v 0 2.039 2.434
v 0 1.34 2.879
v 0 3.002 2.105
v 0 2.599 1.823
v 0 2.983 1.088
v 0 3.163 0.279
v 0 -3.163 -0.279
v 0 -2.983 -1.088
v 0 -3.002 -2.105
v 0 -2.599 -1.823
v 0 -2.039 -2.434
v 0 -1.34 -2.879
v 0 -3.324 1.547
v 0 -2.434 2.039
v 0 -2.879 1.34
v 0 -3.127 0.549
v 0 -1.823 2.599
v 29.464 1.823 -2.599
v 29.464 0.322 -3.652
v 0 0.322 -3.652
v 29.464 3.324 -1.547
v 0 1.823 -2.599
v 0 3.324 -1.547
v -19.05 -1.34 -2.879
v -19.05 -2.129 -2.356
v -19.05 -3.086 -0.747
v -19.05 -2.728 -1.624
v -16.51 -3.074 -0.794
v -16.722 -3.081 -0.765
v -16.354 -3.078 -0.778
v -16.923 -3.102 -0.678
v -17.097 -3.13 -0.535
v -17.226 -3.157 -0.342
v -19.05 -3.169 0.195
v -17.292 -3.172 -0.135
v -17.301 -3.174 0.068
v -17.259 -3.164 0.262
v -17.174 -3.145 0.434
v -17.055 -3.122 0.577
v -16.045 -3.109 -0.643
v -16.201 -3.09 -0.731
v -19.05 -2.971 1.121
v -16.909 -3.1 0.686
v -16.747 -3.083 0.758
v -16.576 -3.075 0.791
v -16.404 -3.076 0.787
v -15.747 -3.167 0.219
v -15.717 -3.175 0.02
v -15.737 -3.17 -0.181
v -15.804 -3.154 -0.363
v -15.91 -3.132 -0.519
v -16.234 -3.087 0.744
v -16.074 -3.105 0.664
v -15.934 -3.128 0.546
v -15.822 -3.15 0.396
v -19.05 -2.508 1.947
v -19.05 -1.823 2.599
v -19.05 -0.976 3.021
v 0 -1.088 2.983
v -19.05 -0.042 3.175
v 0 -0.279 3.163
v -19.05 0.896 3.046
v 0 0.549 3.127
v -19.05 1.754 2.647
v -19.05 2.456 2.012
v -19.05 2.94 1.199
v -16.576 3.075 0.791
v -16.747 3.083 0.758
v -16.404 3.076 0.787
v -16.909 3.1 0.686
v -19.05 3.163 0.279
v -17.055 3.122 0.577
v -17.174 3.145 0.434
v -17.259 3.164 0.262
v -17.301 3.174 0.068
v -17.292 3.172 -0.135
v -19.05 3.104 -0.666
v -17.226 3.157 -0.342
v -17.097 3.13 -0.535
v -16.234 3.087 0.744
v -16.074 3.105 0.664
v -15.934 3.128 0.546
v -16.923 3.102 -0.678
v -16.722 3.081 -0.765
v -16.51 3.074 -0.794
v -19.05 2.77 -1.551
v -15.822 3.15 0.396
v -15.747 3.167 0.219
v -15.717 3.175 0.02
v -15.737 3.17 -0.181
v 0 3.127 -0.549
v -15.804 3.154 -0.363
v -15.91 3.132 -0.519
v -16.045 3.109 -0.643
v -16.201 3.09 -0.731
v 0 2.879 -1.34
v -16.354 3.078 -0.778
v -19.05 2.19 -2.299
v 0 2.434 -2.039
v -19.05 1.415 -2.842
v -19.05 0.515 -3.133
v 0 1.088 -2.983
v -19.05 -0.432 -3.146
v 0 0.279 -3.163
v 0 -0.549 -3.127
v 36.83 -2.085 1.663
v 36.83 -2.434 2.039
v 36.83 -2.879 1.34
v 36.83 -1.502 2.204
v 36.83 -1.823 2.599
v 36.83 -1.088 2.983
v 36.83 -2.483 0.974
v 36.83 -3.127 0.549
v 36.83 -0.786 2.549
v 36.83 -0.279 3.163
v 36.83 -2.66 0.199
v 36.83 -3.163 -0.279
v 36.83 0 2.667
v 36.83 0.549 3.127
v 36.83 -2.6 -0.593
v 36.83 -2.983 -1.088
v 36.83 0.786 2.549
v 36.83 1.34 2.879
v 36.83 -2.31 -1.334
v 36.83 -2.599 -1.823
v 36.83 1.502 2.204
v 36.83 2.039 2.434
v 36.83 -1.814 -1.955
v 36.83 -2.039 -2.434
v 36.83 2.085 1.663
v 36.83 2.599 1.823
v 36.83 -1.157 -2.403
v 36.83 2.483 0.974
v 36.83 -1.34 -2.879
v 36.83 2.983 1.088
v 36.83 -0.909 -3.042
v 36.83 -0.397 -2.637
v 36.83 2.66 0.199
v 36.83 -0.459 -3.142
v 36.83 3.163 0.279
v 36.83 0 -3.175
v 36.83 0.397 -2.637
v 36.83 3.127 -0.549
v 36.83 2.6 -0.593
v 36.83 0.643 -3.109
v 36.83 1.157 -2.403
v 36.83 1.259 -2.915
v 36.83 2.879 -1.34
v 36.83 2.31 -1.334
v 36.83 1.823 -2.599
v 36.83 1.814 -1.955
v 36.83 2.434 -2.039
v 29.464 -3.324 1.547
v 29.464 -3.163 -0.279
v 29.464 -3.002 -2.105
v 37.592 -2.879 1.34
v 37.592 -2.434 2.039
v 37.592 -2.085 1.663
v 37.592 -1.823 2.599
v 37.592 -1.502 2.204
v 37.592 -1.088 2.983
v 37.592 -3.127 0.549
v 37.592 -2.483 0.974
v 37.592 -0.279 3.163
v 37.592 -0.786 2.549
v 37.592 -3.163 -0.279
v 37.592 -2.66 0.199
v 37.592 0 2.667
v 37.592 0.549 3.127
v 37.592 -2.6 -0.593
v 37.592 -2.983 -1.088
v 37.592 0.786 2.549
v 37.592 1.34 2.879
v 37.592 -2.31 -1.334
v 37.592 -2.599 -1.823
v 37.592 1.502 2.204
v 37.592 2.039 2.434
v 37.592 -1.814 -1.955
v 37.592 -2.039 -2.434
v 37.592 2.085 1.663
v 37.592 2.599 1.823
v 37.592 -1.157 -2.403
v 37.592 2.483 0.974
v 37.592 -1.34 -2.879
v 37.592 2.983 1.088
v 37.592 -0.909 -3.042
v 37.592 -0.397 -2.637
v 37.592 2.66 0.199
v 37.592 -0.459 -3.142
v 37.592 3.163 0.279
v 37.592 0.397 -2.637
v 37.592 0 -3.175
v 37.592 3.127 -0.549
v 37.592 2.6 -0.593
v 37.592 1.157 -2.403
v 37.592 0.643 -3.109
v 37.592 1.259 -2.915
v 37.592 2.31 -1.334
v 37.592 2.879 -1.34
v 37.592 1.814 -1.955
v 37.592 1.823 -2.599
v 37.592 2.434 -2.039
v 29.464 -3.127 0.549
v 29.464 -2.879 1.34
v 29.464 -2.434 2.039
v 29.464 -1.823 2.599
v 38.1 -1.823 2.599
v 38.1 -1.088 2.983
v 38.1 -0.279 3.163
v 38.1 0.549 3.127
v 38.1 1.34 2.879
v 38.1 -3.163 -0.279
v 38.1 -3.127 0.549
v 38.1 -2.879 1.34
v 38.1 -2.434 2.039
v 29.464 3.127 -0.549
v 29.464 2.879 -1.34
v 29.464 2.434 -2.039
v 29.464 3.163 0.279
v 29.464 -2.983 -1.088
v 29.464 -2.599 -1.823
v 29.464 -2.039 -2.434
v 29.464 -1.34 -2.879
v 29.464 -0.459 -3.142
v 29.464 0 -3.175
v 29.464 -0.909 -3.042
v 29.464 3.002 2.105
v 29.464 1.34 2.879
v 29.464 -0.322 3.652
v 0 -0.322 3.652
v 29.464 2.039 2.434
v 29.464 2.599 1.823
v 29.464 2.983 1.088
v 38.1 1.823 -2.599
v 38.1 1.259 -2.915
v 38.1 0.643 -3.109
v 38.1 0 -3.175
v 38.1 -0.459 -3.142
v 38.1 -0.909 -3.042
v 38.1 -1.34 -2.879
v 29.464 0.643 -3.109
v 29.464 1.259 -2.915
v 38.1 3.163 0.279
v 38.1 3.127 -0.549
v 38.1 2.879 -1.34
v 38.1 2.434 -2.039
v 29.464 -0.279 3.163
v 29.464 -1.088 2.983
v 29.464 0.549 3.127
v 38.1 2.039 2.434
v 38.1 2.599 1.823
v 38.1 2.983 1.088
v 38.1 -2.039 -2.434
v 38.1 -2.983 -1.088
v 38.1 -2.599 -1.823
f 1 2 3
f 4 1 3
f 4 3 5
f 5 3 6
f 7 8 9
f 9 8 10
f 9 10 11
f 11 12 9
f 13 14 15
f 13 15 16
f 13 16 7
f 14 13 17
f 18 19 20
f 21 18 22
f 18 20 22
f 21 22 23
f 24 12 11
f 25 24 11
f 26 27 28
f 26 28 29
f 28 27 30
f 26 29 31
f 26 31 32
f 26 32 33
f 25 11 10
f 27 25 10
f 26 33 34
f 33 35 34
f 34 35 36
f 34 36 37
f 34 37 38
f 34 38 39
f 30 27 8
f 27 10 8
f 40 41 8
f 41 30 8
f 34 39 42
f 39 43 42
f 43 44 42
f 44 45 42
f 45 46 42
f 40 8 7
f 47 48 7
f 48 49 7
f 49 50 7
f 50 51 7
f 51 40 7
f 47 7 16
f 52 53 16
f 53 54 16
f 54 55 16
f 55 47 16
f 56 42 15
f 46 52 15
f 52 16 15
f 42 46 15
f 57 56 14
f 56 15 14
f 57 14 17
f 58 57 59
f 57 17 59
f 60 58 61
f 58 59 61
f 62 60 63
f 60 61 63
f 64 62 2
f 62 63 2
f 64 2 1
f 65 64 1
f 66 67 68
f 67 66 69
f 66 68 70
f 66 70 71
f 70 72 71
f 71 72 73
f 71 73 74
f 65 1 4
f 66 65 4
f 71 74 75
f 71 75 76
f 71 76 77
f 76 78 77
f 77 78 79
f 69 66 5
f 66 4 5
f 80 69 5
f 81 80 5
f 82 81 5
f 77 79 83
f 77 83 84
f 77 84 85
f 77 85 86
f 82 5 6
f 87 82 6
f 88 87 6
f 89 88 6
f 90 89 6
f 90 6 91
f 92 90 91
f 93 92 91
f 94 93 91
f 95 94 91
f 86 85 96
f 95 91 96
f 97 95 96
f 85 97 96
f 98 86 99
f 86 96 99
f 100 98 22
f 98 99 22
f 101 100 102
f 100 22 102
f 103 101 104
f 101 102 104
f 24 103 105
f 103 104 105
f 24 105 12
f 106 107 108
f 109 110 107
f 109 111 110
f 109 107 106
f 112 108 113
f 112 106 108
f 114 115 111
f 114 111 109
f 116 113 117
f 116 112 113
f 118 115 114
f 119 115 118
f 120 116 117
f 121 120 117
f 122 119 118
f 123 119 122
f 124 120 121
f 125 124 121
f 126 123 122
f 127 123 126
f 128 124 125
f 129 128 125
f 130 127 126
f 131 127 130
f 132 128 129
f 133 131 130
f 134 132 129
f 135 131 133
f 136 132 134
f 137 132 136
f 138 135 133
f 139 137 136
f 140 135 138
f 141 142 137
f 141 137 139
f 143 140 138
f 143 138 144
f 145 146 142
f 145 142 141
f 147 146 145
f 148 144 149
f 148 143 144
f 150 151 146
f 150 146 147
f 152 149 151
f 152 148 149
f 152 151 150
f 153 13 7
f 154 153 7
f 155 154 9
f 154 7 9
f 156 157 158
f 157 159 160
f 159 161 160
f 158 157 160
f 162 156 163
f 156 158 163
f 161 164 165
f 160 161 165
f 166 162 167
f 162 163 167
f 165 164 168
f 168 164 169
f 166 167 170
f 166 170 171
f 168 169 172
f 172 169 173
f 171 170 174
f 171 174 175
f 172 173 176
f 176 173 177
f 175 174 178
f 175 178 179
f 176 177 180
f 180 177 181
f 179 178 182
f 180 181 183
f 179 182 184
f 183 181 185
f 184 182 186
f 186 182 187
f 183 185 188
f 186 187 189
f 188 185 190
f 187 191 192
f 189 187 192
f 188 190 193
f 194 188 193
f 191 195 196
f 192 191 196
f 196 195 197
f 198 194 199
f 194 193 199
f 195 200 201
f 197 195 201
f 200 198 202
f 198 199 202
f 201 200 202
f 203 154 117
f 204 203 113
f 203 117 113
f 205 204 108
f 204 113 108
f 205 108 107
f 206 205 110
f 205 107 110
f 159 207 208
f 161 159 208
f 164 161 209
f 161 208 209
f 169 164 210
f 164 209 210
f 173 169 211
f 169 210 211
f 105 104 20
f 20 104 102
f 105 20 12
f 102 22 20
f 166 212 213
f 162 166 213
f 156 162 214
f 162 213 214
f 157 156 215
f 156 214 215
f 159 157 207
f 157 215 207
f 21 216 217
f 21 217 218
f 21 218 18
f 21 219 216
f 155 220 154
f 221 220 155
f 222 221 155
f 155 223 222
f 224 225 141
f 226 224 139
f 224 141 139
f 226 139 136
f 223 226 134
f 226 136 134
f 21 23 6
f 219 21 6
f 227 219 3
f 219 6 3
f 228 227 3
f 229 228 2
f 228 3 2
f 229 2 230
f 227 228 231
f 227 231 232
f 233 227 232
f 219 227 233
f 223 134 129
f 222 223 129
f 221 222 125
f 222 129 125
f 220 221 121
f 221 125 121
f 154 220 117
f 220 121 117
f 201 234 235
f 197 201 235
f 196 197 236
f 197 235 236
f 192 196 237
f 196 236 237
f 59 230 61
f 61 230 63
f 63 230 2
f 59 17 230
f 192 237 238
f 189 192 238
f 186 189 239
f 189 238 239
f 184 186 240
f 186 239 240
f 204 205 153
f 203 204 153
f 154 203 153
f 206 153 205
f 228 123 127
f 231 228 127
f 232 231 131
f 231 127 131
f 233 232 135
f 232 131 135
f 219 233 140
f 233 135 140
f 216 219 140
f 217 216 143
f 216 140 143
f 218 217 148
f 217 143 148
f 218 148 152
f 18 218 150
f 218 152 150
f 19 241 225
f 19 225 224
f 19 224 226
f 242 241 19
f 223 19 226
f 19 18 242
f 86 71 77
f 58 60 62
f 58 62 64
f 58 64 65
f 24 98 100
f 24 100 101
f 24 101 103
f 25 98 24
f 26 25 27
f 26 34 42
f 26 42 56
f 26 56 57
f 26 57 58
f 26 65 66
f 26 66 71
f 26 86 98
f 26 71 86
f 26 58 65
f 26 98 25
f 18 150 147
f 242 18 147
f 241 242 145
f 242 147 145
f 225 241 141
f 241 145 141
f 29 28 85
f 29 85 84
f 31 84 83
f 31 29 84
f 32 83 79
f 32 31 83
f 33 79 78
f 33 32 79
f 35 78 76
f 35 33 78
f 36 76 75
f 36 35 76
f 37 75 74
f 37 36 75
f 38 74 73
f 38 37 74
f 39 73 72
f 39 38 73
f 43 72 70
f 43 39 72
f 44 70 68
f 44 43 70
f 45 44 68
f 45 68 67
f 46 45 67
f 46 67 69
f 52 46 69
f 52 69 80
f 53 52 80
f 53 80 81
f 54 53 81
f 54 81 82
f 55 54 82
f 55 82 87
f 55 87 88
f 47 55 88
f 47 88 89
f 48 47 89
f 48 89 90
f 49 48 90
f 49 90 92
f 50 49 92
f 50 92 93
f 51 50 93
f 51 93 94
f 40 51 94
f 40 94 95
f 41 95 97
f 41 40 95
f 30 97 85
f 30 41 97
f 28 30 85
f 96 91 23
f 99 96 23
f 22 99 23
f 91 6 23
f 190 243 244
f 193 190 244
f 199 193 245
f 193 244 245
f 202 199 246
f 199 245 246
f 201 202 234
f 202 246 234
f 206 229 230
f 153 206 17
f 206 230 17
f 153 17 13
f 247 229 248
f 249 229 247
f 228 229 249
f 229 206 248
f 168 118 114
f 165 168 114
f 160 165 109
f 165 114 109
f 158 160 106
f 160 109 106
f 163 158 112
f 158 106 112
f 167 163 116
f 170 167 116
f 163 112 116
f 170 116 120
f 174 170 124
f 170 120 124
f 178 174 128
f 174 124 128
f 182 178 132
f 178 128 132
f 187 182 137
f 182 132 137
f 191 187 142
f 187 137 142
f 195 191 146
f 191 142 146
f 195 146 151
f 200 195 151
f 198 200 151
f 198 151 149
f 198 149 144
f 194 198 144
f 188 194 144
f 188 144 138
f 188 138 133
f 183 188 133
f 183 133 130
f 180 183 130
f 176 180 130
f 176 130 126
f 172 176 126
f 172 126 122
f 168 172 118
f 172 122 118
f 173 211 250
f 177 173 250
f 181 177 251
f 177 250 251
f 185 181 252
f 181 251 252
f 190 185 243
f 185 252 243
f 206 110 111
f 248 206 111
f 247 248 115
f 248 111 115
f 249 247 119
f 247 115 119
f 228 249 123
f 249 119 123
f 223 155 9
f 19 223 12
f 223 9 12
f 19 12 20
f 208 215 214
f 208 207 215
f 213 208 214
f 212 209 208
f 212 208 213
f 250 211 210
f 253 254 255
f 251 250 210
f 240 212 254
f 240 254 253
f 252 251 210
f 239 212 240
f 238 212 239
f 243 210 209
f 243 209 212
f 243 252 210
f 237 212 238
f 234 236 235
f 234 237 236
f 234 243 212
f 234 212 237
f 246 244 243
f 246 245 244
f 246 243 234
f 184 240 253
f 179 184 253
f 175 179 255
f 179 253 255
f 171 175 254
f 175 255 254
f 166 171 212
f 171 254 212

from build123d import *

# Parameters (mm, degrees)
BOSS_EXTRUDE1_DEPTH     = 38.1
SKETCH3_R               = 3.175
BOSS_EXTRUDE3_DEPTH     = 19.05
CUT_EXTRUDE1_DEPTH      = 39.418677326
CUT_EXTRUDE1_DEPTH_BACK = 39.418677326
SKETCH4_R               = 0.79375
CUT_EXTRUDE4_DEPTH      = 8.636
SKETCH6_OUTSIDE_W       = 20.904
SKETCH6_OUTSIDE_H       = 20.248
SKETCH6_OUTSIDE_R       = 2.667
CUT_EXTRUDE5_DEPTH      = 0.762


with BuildPart() as part:
    # Sketch1 → Boss-Extrude1 (new body)
    with BuildSketch(Plane(origin=(0, 0, 0), x_dir=(0, 0, -1), z_dir=(1, 0, 0))):
        Polygon((2.105028301, -3.00161443), (3.651988499, 0.32220077), (1.546960198, 3.323815199), (-2.105028301, 3.00161443), (-3.651988499, -0.32220077), (-1.546960198, -3.323815199), align=None)
    extrude(amount=BOSS_EXTRUDE1_DEPTH)

    # Sketch3 → Boss-Extrude3 (add)
    with BuildSketch(Plane.ZY):
        with Locations(Location((0, 0, 0), (0, 0, 204.958070598))):
            Circle(SKETCH3_R)
    extrude(amount=BOSS_EXTRUDE3_DEPTH)

    # Sketch4 → Cut-Extrude1 (cut, two sides: drawn at the far end of the back side and taken through both)
    with BuildSketch(Plane(origin=(0, 0, 0), x_dir=(1, 0, 0), z_dir=(0, 1, 0)).offset(-CUT_EXTRUDE1_DEPTH_BACK)):
        with Locations(Location((-16.51, 0, 0), (0, 0, 90))):
            Circle(SKETCH4_R)
    extrude(amount=CUT_EXTRUDE1_DEPTH + CUT_EXTRUDE1_DEPTH_BACK, mode=Mode.SUBTRACT)

    # Sketch5 → Cut-Extrude4 (cut)
    with BuildSketch(Plane(origin=(38.1, 0, 0), x_dir=(0, 0, -1), z_dir=(1, 0, 0))):
        with BuildLine():
            Line((-2.878508392, 1.339706848), (-2.105028301, 3.00161443))
            ThreePointArc((-2.105028301, 3.00161443), (-3.323815199, 1.546960198), (-3.651988499, -0.32220077))
            Line((-3.651988499, -0.32220077), (-2.878508392, 1.339706848))
        make_face()
        with BuildLine():
            Line((-2.878508392, 1.339706848), (-3.651988499, -0.32220077))
            Line((-3.651988499, -0.32220077), (-2.599474334, -1.823008005))
            ThreePointArc((-2.599474334, -1.823008005), (-3.162714814, -0.279034054), (-2.878508392, 1.339706848))
        make_face()
        with BuildLine():
            ThreePointArc((-3.651988499, -0.32220077), (-3.00161443, -2.105028301), (-1.546960198, -3.323815199))
            Line((-1.546960198, -3.323815199), (-2.599474334, -1.823008005))
            Line((-2.599474334, -1.823008005), (-3.651988499, -0.32220077))
        make_face()
        with BuildLine():
            Line((-2.599474334, -1.823008005), (-1.546960198, -3.323815199))
            Line((-1.546960198, -3.323815199), (0.279034067, -3.162714813))
            ThreePointArc((0.279034067, -3.162714813), (-1.339706811, -2.878508409), (-2.599474334, -1.823008005))
        make_face()
        with BuildLine():
            ThreePointArc((-1.546960198, -3.323815199), (0.32220077, -3.651988499), (2.105028301, -3.00161443))
            Line((2.105028301, -3.00161443), (0.279034067, -3.162714813))
            Line((0.279034067, -3.162714813), (-1.546960198, -3.323815199))
        make_face()
        with BuildLine():
            Line((0.279034067, -3.162714813), (2.105028301, -3.00161443))
            Line((2.105028301, -3.00161443), (2.878508392, -1.339706848))
            ThreePointArc((2.878508392, -1.339706848), (1.823007983, -2.59947435), (0.279034067, -3.162714813))
        make_face()
        with BuildLine():
            ThreePointArc((2.105028301, -3.00161443), (3.252555442, -1.69166085), (3.666174209, 0))
            ThreePointArc((3.666174209, 0), (3.662626065, 0.16125645), (3.651988499, 0.32220077))
            Line((3.651988499, 0.32220077), (2.878508392, -1.339706848))
            Line((2.878508392, -1.339706848), (2.105028301, -3.00161443))
        make_face()
        with BuildLine():
            Line((2.878508392, -1.339706848), (3.651988499, 0.32220077))
            Line((3.651988499, 0.32220077), (2.599474407, 1.823007901))
            ThreePointArc((2.599474407, 1.823007901), (3.027701789, 0.955848774), (3.175, 0))
            ThreePointArc((3.175, 0), (3.09999106, -0.686061534), (2.878508392, -1.339706848))
        make_face()
        with BuildLine():
            Line((2.599474407, 1.823007901), (3.651988499, 0.32220077))
            ThreePointArc((3.651988499, 0.32220077), (3.00161443, 2.105028301), (1.546960198, 3.323815199))
            Line((1.546960198, 3.323815199), (2.599474407, 1.823007901))
        make_face()
        with BuildLine():
            Line((2.599474407, 1.823007901), (1.546960198, 3.323815199))
            Line((1.546960198, 3.323815199), (-0.279034067, 3.162714813))
            ThreePointArc((-0.279034067, 3.162714813), (1.339706869, 2.878508382), (2.599474407, 1.823007901))
        make_face()
        with BuildLine():
            Line((-0.279034067, 3.162714813), (1.546960198, 3.323815199))
            ThreePointArc((1.546960198, 3.323815199), (-0.32220077, 3.651988499), (-2.105028301, 3.00161443))
            Line((-2.105028301, 3.00161443), (-0.279034067, 3.162714813))
        make_face()
        with BuildLine():
            Line((-0.279034067, 3.162714813), (-2.105028301, 3.00161443))
            Line((-2.105028301, 3.00161443), (-2.878508392, 1.339706848))
            ThreePointArc((-2.878508392, 1.339706848), (-1.823007983, 2.59947435), (-0.279034067, 3.162714813))
        make_face()
    extrude(amount=-CUT_EXTRUDE4_DEPTH, mode=Mode.SUBTRACT)

    # Sketch6 outside → Cut-Extrude5 (cut)
    with BuildSketch(Plane(origin=(36.83, 0, 0), x_dir=(0, 0, -1), z_dir=(1, 0, 0))):
        Rectangle(SKETCH6_OUTSIDE_W, SKETCH6_OUTSIDE_H)
        with Locations(Location((0, 0, 0), (0, 0, 180))):
            Circle(SKETCH6_OUTSIDE_R, mode=Mode.SUBTRACT)
    extrude(amount=CUT_EXTRUDE5_DEPTH, mode=Mode.SUBTRACT)


solid = part.part
